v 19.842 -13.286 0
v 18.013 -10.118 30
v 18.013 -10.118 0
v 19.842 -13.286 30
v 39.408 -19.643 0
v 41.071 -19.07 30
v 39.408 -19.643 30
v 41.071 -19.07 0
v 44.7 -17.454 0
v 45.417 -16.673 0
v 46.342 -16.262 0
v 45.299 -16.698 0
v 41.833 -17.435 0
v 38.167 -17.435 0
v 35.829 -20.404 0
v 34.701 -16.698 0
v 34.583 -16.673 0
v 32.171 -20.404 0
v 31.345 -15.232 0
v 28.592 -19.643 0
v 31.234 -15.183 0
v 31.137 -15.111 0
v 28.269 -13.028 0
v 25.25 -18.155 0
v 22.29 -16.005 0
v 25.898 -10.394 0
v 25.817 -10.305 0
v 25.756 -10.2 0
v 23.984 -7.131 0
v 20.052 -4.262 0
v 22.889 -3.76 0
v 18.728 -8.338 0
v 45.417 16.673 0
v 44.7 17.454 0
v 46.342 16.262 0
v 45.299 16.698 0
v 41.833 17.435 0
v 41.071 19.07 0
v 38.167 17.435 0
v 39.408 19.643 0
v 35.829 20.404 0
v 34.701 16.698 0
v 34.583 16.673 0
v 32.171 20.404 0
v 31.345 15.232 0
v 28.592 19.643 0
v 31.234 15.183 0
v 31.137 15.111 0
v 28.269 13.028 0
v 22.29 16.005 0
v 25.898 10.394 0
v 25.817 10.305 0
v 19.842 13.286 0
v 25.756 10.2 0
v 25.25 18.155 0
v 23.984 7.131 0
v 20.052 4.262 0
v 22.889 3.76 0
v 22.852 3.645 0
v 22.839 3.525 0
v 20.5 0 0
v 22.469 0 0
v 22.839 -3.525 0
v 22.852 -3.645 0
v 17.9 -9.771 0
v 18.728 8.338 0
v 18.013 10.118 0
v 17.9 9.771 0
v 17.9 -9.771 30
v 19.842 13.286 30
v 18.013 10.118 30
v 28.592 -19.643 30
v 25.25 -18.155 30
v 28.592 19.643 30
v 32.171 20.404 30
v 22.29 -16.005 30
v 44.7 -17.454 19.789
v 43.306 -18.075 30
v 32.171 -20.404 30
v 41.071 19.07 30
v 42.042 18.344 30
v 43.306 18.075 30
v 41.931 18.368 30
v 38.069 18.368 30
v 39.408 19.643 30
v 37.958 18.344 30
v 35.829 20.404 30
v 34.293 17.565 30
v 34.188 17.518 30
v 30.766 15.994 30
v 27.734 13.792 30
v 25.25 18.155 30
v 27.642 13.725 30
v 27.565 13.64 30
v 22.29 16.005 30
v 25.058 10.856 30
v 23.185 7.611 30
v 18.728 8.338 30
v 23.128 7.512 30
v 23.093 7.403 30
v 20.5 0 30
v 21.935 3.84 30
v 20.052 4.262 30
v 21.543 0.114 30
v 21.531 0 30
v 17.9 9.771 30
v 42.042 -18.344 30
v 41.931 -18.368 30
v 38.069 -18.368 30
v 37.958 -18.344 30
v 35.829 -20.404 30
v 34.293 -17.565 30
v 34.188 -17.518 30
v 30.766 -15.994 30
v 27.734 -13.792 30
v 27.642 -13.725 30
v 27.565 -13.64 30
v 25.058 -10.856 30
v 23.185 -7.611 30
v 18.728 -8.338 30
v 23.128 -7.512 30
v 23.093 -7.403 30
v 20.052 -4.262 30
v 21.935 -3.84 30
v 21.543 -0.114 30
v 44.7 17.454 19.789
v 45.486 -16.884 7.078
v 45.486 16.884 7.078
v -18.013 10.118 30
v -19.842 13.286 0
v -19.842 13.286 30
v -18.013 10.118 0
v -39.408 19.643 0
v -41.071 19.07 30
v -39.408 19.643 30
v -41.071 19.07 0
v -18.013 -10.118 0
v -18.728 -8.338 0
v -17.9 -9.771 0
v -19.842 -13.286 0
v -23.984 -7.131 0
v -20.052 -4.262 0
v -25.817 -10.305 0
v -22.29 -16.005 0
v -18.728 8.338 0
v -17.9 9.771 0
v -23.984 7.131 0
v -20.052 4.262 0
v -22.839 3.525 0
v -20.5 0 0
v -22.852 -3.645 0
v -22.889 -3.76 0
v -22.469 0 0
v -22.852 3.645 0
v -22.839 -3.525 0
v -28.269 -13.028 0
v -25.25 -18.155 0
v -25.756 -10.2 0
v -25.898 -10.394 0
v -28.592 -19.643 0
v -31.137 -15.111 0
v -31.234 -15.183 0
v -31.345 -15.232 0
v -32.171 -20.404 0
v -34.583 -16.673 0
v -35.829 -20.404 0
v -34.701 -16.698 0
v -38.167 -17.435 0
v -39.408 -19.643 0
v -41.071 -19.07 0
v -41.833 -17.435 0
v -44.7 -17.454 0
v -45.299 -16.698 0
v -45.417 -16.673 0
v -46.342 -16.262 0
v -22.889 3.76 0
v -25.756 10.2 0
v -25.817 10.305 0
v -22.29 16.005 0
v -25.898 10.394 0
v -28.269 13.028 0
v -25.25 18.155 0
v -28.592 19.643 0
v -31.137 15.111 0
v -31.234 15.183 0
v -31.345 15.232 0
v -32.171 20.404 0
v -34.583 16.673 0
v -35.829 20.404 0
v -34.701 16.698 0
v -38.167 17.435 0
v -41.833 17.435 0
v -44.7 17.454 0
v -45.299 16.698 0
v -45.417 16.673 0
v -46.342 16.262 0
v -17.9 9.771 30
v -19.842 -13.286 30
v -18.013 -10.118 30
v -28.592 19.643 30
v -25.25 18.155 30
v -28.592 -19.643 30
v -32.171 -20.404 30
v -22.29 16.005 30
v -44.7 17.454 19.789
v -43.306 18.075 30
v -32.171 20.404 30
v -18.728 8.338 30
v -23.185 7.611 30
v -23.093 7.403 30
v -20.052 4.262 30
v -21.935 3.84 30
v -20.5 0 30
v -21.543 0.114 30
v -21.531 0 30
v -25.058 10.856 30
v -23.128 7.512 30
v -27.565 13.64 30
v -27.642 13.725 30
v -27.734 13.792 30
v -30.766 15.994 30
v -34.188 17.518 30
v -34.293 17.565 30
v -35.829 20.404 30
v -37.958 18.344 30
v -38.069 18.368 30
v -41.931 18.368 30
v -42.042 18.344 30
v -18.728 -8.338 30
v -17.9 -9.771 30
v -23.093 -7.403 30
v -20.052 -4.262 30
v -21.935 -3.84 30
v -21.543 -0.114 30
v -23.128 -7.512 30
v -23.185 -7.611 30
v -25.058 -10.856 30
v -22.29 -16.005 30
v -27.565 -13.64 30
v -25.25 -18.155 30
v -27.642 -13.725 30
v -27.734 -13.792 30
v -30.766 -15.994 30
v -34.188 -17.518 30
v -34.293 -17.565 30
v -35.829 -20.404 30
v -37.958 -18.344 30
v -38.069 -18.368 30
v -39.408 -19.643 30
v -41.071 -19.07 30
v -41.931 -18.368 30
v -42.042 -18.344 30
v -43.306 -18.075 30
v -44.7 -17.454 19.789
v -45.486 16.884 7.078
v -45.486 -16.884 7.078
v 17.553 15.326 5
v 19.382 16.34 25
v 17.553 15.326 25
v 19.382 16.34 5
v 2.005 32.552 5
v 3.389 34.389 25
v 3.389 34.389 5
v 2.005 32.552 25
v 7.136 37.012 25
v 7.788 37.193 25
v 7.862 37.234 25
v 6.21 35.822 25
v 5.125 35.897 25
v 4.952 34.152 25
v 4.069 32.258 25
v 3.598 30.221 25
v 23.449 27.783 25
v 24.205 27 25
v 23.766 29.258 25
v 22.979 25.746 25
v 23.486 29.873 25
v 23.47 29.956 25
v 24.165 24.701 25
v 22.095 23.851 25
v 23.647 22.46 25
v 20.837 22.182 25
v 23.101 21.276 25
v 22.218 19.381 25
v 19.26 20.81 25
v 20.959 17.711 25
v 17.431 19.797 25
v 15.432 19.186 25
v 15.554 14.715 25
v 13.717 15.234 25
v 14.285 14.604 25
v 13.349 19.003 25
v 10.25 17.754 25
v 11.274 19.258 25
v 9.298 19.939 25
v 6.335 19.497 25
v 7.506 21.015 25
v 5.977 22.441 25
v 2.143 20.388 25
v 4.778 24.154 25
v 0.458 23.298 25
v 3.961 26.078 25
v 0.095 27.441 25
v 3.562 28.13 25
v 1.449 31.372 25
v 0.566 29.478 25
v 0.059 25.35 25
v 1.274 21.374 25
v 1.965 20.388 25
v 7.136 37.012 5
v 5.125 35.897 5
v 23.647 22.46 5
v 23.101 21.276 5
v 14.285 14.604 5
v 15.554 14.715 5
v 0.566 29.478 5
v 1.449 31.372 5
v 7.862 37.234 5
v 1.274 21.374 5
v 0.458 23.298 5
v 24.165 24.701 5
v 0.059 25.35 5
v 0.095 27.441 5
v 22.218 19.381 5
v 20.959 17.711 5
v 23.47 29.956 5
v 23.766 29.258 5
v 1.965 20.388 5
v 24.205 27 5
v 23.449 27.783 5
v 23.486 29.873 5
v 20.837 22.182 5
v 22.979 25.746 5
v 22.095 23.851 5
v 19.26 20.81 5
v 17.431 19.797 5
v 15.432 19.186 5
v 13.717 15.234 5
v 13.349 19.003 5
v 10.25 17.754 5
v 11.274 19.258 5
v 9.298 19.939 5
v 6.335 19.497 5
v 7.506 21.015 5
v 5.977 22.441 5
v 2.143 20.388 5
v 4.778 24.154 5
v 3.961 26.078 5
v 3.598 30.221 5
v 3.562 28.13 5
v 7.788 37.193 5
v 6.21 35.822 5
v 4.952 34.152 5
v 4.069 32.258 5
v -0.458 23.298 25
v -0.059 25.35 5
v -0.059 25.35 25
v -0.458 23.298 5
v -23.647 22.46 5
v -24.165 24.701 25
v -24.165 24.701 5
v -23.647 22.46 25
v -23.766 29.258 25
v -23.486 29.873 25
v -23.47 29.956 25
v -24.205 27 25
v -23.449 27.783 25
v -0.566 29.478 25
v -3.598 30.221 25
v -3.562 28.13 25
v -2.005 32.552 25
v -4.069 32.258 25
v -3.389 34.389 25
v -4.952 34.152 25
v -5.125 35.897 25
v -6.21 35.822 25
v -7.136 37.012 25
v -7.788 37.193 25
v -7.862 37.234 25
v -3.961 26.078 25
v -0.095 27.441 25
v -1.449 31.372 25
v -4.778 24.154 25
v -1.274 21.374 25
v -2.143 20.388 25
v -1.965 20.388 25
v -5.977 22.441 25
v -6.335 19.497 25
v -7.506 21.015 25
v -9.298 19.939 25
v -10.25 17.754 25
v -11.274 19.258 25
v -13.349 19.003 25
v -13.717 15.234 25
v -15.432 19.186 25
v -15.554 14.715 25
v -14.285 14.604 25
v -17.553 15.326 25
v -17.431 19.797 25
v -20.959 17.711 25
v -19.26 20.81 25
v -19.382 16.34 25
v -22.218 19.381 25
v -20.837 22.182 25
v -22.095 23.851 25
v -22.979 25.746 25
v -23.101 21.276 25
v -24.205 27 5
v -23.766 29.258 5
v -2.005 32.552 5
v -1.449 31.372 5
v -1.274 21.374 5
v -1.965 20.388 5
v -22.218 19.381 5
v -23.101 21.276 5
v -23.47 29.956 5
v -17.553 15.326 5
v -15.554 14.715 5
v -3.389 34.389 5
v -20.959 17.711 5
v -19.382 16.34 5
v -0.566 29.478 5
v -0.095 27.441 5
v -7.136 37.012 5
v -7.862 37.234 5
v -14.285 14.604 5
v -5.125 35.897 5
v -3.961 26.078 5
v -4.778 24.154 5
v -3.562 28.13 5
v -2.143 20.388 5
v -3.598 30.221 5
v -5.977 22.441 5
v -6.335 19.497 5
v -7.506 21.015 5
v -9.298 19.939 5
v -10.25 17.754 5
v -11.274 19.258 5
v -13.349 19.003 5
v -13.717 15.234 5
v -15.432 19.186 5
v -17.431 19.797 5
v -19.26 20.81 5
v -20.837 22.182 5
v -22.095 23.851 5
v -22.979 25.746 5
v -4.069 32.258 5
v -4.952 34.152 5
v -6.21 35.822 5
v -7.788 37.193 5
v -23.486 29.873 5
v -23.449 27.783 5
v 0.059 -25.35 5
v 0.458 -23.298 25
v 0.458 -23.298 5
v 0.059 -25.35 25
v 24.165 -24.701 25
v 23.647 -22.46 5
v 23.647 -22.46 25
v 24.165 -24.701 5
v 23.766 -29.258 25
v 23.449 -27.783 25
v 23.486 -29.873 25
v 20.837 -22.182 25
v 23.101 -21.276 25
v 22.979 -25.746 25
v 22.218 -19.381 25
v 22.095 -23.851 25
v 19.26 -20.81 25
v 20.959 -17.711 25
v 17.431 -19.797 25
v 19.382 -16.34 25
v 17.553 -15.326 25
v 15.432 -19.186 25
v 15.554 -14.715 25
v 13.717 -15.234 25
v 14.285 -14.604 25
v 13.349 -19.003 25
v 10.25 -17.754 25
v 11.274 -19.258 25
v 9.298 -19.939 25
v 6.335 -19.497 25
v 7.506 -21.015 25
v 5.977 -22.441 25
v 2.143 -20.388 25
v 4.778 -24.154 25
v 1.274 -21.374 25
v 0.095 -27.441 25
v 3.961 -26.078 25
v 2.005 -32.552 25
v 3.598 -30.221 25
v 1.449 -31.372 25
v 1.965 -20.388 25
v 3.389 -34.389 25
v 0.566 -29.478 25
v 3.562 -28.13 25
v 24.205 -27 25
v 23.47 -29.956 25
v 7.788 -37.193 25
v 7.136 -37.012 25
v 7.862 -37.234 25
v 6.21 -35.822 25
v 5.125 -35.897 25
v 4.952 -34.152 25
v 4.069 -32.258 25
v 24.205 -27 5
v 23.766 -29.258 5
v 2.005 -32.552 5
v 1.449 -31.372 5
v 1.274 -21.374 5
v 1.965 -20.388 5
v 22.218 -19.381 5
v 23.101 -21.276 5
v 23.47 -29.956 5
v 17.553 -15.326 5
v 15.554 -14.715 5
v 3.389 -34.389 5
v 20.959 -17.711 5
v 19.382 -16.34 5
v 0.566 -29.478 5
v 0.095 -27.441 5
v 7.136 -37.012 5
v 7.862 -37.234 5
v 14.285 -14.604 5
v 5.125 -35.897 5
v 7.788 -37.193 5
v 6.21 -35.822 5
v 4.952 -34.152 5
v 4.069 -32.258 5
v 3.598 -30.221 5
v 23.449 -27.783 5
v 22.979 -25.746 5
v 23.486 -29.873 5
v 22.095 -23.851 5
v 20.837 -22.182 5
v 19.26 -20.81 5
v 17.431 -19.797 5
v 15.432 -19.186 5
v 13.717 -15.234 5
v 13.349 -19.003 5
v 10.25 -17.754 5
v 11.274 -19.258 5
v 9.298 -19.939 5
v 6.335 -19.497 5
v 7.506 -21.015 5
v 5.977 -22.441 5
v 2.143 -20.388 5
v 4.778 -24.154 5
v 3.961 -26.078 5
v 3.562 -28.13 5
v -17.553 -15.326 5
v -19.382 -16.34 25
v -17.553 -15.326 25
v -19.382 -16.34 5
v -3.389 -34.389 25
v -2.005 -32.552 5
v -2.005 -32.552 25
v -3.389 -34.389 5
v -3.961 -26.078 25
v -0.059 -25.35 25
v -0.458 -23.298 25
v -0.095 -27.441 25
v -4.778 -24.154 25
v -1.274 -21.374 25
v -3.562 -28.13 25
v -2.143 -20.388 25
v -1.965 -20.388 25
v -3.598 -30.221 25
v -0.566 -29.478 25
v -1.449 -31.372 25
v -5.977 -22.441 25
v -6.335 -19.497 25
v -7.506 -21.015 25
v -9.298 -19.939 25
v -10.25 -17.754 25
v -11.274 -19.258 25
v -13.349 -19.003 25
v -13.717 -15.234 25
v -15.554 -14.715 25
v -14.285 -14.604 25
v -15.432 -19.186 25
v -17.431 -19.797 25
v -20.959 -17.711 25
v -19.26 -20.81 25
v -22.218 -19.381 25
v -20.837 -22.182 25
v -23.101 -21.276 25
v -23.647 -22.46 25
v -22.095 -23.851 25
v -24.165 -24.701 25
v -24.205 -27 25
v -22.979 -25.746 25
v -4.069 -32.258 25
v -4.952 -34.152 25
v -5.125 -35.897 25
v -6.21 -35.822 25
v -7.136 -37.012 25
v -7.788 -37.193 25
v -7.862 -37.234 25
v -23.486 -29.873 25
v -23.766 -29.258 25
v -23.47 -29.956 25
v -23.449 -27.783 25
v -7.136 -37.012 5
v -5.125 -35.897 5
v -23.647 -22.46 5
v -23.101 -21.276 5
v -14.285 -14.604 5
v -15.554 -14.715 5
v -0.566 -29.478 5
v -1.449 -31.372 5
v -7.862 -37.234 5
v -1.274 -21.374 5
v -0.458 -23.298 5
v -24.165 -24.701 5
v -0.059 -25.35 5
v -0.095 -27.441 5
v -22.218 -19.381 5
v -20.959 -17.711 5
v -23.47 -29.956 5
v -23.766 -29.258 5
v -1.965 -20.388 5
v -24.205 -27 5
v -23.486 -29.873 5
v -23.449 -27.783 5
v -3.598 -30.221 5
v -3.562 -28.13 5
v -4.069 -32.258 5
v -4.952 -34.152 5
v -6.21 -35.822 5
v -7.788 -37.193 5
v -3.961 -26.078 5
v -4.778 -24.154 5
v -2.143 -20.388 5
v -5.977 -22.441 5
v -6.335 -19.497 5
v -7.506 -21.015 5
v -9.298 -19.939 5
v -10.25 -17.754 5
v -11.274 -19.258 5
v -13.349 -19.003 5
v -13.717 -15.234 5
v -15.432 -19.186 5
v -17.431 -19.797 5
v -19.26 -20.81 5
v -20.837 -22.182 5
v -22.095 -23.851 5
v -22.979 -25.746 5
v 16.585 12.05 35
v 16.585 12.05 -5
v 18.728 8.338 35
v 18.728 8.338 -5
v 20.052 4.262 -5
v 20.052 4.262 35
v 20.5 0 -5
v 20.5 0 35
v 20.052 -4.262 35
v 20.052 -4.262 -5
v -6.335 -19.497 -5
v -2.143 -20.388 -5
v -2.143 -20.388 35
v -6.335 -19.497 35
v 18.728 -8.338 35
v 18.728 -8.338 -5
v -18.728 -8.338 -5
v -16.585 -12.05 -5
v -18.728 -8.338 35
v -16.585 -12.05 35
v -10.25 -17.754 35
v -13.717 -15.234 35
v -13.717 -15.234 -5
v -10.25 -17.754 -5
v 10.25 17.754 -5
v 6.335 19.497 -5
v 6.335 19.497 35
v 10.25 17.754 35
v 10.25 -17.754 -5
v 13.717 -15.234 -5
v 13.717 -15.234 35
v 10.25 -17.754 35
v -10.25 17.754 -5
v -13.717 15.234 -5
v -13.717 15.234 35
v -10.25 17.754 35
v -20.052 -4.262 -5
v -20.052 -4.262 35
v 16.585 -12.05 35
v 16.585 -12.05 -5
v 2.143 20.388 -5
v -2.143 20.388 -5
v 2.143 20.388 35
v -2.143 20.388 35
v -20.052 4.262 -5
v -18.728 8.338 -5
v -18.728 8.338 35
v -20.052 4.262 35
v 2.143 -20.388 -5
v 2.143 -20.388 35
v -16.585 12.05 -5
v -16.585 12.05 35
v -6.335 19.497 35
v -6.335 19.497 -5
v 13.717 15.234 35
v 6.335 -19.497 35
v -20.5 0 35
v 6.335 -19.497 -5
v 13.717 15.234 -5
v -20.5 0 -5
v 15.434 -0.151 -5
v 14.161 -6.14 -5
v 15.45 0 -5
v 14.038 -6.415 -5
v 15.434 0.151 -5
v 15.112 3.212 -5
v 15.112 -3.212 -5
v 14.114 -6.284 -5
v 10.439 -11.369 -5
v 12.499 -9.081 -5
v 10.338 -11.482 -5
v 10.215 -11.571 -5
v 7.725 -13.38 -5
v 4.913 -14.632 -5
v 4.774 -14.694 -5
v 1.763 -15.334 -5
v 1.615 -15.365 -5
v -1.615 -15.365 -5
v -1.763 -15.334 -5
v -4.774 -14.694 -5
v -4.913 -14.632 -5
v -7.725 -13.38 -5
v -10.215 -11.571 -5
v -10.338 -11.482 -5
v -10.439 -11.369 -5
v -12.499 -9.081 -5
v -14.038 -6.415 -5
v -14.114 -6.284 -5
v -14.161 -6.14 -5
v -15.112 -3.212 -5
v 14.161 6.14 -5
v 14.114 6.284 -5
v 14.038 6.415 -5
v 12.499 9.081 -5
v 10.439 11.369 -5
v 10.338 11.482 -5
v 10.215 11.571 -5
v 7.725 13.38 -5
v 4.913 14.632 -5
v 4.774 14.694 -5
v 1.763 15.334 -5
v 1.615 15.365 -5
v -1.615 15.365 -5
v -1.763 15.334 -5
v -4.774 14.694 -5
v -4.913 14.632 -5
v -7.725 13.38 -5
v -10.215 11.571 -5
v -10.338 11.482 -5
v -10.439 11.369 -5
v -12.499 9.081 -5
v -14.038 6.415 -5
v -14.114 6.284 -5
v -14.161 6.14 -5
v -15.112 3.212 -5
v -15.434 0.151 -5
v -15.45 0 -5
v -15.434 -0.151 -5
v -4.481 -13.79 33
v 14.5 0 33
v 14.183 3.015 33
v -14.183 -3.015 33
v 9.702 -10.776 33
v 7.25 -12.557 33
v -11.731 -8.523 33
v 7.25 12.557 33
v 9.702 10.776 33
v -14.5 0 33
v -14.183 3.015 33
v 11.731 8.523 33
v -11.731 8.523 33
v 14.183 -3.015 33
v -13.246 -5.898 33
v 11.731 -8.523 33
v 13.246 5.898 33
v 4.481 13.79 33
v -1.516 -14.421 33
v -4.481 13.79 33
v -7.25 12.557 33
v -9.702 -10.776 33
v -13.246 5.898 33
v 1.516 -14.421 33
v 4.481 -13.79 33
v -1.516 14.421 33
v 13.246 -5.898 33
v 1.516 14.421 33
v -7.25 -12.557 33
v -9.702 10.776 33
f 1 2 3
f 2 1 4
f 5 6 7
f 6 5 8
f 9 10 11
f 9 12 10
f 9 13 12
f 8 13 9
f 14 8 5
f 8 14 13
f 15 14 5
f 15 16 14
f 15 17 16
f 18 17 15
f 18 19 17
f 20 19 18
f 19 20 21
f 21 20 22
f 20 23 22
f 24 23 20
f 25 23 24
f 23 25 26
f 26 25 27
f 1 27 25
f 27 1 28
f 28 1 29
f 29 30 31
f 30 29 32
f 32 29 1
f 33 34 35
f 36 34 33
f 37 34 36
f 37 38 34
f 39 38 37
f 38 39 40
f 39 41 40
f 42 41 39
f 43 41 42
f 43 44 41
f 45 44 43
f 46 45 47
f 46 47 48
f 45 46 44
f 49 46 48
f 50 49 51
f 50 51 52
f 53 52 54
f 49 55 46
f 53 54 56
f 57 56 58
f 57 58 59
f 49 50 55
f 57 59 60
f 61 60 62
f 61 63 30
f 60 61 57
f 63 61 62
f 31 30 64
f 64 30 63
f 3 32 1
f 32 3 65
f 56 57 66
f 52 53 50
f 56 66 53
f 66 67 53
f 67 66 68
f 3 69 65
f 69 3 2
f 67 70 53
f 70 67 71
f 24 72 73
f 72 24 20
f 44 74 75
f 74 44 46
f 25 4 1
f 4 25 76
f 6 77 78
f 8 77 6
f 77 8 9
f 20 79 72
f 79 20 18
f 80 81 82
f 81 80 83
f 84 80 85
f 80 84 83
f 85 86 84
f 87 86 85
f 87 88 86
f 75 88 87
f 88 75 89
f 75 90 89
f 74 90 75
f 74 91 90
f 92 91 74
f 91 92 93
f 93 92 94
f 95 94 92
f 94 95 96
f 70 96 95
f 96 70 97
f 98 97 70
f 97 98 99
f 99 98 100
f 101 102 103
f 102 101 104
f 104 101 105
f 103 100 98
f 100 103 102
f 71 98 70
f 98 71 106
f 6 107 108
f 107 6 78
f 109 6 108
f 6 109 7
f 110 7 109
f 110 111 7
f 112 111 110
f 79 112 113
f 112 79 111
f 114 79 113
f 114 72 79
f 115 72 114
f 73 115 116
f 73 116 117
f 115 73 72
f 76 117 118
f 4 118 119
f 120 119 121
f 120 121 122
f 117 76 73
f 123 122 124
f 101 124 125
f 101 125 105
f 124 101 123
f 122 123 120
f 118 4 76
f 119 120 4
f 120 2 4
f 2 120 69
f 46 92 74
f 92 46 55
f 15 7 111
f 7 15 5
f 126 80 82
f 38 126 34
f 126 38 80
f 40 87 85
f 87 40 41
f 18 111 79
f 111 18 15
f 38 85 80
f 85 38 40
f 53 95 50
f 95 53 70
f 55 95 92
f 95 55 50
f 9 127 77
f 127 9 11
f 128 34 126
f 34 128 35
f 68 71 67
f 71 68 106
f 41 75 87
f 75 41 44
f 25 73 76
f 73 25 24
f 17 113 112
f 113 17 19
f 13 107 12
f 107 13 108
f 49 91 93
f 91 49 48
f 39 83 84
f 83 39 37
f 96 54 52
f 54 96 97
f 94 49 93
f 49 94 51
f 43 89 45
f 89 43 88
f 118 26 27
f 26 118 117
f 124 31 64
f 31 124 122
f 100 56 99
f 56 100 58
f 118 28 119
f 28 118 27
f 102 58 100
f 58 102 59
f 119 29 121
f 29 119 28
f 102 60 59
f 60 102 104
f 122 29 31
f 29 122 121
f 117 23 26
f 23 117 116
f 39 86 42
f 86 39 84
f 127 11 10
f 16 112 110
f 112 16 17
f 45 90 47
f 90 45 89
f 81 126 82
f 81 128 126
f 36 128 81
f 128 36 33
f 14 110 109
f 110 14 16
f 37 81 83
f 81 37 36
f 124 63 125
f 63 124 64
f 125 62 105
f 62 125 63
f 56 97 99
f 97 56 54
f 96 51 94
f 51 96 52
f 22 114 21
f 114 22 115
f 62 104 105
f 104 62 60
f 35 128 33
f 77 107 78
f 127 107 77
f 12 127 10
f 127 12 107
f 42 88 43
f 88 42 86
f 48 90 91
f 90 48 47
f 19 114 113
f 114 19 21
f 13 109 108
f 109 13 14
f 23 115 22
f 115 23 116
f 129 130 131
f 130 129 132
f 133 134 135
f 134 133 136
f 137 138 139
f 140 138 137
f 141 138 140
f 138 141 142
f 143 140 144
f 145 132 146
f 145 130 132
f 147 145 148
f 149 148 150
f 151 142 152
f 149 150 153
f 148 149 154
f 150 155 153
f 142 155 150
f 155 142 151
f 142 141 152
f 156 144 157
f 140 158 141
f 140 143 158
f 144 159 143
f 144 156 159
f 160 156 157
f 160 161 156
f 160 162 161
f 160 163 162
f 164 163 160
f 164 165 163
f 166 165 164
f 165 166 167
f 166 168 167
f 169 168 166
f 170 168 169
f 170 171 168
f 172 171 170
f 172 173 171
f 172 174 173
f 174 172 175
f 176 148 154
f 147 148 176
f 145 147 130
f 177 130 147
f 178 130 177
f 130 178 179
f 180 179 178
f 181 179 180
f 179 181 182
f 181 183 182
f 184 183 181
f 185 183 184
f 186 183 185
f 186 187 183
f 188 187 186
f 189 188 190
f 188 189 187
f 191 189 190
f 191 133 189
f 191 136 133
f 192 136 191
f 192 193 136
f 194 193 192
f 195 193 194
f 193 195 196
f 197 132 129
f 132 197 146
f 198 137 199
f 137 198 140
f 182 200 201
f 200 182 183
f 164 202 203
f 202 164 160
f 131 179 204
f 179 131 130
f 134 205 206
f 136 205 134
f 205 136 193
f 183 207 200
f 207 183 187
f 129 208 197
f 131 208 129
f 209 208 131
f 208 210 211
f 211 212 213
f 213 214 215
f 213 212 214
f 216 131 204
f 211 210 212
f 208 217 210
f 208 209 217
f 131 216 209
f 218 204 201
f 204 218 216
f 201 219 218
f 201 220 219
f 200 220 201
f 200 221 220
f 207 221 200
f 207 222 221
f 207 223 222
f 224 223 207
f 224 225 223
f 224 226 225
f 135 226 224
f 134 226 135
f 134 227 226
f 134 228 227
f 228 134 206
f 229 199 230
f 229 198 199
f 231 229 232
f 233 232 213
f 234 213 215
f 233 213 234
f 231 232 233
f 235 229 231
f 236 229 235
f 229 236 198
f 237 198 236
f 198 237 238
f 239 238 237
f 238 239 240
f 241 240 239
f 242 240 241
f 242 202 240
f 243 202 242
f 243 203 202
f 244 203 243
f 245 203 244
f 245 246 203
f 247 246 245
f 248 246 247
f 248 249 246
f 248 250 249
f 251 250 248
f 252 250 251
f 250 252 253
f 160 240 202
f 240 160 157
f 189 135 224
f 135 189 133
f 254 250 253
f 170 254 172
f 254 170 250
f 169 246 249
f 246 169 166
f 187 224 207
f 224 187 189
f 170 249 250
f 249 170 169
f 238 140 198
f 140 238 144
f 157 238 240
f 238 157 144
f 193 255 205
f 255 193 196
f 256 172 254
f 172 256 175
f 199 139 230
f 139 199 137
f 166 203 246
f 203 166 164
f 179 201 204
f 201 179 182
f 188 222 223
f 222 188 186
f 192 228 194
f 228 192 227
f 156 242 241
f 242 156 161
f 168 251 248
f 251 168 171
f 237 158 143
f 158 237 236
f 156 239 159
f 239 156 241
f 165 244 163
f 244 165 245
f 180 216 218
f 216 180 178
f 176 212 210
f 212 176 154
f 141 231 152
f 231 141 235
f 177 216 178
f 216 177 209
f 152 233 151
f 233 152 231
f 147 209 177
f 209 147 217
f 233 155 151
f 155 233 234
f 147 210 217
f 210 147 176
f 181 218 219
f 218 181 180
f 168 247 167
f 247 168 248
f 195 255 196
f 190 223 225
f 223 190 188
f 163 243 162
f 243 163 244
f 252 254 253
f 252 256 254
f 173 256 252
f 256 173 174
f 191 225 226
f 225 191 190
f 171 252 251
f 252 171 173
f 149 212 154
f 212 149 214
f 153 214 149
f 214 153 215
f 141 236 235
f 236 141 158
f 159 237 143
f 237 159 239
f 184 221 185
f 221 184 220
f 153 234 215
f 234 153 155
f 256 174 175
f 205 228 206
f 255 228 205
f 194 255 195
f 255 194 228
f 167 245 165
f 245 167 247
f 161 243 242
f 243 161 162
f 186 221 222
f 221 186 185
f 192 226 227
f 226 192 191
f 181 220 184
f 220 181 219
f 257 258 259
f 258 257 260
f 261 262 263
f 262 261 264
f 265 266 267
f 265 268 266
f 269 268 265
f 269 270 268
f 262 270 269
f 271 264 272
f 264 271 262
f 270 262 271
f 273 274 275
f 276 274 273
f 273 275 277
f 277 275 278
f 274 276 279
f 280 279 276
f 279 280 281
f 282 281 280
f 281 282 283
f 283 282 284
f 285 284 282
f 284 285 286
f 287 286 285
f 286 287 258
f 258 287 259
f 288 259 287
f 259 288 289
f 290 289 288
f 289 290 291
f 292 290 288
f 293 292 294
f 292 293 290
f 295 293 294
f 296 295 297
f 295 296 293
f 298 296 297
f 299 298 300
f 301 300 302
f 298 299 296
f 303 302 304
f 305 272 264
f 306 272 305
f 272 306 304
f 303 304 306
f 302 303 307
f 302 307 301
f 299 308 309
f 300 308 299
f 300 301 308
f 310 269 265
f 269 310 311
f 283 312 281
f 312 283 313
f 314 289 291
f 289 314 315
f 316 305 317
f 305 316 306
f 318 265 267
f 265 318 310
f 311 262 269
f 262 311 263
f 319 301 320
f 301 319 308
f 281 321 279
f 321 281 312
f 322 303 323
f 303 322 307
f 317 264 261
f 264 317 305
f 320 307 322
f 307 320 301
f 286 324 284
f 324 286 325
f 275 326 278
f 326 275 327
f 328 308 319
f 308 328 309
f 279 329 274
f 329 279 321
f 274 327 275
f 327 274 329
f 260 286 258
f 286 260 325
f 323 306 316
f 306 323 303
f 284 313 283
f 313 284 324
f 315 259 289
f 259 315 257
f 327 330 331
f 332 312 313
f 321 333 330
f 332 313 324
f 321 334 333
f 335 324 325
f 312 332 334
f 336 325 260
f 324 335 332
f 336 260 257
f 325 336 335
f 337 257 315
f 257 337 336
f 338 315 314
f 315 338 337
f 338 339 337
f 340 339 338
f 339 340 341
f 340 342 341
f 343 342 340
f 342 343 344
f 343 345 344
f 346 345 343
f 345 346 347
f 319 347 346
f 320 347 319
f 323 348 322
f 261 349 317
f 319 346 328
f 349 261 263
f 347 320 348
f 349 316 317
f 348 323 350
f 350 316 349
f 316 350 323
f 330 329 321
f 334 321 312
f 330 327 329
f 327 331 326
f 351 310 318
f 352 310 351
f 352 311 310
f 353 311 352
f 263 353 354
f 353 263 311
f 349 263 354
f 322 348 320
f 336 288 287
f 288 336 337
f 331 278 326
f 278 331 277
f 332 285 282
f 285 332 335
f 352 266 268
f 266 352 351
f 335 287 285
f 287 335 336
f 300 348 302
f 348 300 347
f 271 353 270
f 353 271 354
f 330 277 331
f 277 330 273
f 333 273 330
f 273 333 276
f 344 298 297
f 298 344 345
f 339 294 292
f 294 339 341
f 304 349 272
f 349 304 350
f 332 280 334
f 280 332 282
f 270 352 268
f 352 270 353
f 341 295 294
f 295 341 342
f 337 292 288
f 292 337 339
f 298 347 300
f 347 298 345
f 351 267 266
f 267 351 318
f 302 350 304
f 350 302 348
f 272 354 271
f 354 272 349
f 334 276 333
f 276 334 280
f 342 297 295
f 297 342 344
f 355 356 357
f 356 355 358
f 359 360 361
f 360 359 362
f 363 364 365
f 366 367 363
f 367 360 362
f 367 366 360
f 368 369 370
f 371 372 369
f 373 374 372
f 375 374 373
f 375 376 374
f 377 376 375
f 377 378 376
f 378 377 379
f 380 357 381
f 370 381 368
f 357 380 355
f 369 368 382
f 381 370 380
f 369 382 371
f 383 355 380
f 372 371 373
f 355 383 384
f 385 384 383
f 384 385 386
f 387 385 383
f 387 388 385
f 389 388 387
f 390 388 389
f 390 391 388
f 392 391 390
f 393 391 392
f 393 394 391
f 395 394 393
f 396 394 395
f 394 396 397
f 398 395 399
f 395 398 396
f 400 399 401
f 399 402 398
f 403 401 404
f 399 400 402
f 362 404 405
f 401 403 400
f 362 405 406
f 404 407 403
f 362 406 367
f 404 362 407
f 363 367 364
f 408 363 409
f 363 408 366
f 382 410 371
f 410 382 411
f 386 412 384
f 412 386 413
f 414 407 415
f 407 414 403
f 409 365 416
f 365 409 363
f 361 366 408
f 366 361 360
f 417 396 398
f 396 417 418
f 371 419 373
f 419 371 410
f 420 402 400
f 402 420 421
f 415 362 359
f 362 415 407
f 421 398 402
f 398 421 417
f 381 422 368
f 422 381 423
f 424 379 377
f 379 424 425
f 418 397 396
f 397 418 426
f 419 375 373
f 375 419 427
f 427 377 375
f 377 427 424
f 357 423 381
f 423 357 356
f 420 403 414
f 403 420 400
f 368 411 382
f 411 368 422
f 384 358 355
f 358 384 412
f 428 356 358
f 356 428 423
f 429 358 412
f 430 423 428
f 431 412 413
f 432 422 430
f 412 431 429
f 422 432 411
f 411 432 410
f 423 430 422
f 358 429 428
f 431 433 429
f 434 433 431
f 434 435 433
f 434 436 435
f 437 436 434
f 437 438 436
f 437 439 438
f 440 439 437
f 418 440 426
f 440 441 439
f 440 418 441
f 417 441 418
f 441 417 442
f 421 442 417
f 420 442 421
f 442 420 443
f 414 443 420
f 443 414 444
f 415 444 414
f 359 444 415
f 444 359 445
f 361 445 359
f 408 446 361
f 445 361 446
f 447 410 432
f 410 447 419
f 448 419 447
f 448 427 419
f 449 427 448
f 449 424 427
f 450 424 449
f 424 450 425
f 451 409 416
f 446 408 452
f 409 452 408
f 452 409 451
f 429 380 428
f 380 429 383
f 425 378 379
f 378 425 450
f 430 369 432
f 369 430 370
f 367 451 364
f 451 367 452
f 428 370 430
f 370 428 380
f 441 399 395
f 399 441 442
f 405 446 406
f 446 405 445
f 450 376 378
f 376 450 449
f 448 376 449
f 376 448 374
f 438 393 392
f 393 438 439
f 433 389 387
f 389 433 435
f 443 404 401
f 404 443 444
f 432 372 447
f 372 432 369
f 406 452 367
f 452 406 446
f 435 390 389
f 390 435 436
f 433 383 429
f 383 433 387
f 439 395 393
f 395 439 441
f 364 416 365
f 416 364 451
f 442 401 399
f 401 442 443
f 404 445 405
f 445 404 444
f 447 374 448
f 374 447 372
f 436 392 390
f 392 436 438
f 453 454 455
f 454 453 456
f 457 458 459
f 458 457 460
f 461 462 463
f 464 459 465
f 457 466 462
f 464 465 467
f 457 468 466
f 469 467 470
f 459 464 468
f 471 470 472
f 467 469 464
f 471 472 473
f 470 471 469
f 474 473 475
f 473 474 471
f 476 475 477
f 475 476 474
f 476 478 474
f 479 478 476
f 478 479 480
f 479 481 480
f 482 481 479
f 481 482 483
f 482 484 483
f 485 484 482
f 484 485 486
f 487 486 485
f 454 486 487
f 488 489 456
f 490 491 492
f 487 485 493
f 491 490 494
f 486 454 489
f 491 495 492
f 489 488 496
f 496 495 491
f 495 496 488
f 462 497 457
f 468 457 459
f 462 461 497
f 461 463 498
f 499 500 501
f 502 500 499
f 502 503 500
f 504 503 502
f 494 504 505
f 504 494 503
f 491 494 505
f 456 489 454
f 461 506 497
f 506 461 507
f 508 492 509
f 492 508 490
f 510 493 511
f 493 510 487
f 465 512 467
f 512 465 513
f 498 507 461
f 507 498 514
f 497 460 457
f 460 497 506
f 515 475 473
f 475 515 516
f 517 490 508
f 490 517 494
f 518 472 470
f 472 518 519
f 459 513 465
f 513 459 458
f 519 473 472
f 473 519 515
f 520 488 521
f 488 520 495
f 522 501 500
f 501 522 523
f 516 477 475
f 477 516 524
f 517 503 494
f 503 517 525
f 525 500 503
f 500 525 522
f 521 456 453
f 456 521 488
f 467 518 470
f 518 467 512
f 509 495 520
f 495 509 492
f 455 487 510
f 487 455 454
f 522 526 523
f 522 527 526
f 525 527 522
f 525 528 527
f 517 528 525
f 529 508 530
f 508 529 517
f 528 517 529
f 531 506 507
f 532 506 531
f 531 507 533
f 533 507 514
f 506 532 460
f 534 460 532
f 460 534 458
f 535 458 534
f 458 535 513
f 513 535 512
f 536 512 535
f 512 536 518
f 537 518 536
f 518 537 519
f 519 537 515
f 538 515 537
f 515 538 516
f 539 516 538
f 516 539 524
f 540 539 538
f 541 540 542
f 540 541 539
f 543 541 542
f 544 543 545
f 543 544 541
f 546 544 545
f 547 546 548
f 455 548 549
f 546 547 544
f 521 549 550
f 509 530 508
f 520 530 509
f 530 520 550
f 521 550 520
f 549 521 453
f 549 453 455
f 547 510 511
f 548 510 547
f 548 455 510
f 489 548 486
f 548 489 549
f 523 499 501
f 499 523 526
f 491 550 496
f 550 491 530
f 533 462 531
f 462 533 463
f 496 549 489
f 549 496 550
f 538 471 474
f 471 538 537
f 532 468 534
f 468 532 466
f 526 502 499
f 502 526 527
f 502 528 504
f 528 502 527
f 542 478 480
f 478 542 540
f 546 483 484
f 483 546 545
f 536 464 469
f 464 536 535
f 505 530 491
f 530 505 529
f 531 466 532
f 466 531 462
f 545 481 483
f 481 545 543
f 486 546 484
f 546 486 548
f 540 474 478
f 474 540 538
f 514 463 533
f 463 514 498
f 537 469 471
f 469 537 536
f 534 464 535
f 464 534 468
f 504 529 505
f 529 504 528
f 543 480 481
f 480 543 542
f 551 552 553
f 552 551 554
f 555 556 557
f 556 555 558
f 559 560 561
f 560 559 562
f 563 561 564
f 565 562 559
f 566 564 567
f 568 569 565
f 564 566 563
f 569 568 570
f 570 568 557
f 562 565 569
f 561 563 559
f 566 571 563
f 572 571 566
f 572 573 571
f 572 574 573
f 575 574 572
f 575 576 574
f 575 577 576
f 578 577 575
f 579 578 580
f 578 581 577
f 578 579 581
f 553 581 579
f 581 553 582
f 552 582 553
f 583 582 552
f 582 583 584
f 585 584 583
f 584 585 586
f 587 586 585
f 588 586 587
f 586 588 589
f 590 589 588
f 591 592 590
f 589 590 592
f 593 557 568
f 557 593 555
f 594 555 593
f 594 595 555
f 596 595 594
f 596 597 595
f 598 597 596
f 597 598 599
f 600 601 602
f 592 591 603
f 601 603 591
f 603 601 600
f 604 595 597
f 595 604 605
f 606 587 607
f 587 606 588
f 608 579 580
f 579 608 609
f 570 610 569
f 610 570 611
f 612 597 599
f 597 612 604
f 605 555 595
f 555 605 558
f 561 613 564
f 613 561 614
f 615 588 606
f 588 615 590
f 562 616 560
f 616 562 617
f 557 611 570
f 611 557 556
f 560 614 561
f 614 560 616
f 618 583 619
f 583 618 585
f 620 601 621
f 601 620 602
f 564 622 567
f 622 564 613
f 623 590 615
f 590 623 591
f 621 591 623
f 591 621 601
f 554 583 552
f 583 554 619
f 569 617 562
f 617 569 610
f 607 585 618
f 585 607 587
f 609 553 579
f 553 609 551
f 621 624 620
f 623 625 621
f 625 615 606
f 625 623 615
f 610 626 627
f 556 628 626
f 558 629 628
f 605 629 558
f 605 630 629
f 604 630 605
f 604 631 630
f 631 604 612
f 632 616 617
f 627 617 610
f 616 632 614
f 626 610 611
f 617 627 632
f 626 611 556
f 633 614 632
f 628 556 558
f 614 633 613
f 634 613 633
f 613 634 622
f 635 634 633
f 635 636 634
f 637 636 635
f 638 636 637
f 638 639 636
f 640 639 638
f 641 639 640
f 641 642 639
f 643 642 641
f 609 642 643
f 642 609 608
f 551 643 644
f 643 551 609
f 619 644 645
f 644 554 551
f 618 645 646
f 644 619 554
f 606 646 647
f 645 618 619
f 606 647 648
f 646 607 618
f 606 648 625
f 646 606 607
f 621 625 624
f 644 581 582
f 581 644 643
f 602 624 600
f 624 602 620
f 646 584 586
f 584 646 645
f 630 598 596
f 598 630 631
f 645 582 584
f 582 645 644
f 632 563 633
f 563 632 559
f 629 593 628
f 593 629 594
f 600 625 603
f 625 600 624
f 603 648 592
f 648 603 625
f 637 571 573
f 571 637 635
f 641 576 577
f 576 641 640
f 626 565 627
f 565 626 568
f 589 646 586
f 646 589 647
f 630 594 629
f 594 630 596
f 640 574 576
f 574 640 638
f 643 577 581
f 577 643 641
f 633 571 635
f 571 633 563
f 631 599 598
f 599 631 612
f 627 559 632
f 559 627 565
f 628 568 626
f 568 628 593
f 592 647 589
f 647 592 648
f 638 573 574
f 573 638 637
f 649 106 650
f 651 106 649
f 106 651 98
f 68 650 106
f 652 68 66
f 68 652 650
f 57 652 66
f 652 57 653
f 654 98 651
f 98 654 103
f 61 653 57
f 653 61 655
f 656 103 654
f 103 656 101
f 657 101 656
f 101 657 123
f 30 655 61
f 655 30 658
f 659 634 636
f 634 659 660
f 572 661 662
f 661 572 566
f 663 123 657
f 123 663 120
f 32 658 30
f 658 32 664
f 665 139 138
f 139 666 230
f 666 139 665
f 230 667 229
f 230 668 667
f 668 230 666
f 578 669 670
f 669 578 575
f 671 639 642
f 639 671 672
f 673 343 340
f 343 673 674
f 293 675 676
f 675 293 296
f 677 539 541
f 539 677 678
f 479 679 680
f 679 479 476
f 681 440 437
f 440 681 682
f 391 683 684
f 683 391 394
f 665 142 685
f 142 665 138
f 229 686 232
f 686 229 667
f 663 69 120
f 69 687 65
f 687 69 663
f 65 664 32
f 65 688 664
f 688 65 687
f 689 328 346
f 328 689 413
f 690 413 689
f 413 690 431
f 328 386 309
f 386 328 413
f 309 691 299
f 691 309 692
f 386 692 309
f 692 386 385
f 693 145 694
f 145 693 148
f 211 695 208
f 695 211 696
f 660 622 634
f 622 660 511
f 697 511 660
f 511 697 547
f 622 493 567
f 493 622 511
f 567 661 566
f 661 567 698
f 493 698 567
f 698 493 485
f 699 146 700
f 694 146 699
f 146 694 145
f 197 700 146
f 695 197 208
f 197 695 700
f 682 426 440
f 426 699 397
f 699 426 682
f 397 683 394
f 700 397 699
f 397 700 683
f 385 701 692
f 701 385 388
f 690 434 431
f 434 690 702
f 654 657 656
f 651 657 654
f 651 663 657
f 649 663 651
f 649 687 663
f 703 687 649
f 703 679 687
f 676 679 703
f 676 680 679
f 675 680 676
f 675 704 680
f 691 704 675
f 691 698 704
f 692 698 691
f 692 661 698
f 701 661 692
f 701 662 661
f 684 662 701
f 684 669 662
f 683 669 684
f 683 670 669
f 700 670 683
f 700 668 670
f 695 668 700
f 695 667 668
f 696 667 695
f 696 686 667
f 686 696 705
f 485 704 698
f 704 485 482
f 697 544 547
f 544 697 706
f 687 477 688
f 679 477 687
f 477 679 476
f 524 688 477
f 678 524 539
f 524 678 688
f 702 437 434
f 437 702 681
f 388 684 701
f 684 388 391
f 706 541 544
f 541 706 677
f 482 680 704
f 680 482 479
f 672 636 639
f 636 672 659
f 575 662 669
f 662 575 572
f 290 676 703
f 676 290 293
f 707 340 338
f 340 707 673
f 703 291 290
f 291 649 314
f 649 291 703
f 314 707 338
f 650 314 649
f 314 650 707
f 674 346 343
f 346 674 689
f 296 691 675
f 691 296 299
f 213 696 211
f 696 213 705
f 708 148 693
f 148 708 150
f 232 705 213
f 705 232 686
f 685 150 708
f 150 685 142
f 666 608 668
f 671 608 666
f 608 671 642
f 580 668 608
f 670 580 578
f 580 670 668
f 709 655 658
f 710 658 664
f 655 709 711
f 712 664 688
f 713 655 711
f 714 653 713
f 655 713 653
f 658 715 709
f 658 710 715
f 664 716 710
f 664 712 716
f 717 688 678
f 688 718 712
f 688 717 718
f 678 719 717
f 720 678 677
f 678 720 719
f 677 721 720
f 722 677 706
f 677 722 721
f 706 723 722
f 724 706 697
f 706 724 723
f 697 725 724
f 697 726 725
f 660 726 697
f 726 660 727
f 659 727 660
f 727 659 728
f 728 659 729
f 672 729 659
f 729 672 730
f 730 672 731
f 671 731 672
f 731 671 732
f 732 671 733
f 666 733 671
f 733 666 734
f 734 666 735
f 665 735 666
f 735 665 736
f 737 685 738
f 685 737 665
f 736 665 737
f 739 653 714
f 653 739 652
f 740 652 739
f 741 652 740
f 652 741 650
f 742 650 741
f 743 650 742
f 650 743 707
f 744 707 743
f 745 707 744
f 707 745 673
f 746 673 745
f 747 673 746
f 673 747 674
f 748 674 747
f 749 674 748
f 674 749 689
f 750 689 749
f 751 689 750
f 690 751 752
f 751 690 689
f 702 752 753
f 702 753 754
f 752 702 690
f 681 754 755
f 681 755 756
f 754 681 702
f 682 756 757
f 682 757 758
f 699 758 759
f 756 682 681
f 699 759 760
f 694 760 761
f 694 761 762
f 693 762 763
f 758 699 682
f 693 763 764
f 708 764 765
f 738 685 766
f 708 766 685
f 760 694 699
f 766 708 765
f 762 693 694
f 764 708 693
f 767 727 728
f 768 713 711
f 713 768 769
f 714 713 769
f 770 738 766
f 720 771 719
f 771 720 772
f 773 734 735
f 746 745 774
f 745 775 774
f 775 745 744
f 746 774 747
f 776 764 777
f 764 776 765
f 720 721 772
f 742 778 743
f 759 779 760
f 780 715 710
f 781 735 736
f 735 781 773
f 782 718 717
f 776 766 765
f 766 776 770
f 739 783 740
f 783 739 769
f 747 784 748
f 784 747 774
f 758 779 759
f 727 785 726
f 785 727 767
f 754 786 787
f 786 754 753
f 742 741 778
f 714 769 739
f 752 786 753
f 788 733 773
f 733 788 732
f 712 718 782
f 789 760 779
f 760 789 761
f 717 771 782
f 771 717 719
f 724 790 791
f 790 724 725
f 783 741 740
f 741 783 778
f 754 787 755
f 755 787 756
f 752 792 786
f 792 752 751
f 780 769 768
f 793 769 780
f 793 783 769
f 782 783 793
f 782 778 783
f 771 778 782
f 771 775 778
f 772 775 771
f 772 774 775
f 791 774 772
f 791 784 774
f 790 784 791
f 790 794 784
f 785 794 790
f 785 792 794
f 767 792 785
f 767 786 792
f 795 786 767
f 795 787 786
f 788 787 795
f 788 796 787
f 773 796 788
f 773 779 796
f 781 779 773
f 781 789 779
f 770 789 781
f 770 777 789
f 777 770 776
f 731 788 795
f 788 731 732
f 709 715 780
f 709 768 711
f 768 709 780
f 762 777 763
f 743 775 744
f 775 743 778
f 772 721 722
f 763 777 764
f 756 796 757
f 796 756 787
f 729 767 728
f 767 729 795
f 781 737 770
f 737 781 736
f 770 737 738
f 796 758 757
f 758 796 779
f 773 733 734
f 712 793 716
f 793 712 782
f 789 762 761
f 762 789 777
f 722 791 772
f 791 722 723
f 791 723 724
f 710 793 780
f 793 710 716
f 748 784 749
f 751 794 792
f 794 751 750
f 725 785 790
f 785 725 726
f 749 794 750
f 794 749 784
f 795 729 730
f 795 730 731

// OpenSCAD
module snap( d, x, height, taper=0 )
{
	difference() {
		linear_extrude( height, convexity=4 ) {
			hull() {
				translate( [0,-x,0] ) circle( d=d );
				translate( [0, x,0] ) circle( d=d );
				translate( [1.2, 1,0] ) circle( d=d+x );
				translate( [1.2, -1,0] ) circle( d=d+x );
			}
		}
		translate( [2*x,0,-1] ) cylinder( d1=d, d2=d+taper, h=height+2 );
	}
}

module shots()
{
	bottle = 31;
	glass = 35;
	flavour = 20;
	thickness = 2;

	away =  34;
	away2 = 28;
	height1 = 40;
	height2 = 30;
	height3 = 20;

	translate( [away,0,0] ) snap( glass, 3, height2,2 );
	rotate( [0,0,180] ) translate( [away,0,0] ) snap(glass,3, height2, 2);

	translate( [0,0,5] ) {
		rotate( [0,0,65] ) translate( [away2,0,0] ) snap(flavour,2, height3);
		rotate( [0,0,115] ) translate( [away2,0,0] ) snap(flavour,2, height3);
		rotate( [0,0,-65] ) translate( [away2,0,0] ) snap(flavour,2, height3);
		rotate( [0,0,-115] ) translate( [away2,0,0] ) snap(flavour,2, height3);
	}

	translate( [0,0,-5] ) difference() {
		cylinder( d=bottle + 10, h=height1 );
		translate( [0,0,-thickness] ) cylinder( d1=bottle, d2=bottle-2, h=height1 );
		//translate( [0,0,height1-1] ) cylinder( d=bottle-1,h=10 );
	}
}
//snap(20,2,20);
 shots();
